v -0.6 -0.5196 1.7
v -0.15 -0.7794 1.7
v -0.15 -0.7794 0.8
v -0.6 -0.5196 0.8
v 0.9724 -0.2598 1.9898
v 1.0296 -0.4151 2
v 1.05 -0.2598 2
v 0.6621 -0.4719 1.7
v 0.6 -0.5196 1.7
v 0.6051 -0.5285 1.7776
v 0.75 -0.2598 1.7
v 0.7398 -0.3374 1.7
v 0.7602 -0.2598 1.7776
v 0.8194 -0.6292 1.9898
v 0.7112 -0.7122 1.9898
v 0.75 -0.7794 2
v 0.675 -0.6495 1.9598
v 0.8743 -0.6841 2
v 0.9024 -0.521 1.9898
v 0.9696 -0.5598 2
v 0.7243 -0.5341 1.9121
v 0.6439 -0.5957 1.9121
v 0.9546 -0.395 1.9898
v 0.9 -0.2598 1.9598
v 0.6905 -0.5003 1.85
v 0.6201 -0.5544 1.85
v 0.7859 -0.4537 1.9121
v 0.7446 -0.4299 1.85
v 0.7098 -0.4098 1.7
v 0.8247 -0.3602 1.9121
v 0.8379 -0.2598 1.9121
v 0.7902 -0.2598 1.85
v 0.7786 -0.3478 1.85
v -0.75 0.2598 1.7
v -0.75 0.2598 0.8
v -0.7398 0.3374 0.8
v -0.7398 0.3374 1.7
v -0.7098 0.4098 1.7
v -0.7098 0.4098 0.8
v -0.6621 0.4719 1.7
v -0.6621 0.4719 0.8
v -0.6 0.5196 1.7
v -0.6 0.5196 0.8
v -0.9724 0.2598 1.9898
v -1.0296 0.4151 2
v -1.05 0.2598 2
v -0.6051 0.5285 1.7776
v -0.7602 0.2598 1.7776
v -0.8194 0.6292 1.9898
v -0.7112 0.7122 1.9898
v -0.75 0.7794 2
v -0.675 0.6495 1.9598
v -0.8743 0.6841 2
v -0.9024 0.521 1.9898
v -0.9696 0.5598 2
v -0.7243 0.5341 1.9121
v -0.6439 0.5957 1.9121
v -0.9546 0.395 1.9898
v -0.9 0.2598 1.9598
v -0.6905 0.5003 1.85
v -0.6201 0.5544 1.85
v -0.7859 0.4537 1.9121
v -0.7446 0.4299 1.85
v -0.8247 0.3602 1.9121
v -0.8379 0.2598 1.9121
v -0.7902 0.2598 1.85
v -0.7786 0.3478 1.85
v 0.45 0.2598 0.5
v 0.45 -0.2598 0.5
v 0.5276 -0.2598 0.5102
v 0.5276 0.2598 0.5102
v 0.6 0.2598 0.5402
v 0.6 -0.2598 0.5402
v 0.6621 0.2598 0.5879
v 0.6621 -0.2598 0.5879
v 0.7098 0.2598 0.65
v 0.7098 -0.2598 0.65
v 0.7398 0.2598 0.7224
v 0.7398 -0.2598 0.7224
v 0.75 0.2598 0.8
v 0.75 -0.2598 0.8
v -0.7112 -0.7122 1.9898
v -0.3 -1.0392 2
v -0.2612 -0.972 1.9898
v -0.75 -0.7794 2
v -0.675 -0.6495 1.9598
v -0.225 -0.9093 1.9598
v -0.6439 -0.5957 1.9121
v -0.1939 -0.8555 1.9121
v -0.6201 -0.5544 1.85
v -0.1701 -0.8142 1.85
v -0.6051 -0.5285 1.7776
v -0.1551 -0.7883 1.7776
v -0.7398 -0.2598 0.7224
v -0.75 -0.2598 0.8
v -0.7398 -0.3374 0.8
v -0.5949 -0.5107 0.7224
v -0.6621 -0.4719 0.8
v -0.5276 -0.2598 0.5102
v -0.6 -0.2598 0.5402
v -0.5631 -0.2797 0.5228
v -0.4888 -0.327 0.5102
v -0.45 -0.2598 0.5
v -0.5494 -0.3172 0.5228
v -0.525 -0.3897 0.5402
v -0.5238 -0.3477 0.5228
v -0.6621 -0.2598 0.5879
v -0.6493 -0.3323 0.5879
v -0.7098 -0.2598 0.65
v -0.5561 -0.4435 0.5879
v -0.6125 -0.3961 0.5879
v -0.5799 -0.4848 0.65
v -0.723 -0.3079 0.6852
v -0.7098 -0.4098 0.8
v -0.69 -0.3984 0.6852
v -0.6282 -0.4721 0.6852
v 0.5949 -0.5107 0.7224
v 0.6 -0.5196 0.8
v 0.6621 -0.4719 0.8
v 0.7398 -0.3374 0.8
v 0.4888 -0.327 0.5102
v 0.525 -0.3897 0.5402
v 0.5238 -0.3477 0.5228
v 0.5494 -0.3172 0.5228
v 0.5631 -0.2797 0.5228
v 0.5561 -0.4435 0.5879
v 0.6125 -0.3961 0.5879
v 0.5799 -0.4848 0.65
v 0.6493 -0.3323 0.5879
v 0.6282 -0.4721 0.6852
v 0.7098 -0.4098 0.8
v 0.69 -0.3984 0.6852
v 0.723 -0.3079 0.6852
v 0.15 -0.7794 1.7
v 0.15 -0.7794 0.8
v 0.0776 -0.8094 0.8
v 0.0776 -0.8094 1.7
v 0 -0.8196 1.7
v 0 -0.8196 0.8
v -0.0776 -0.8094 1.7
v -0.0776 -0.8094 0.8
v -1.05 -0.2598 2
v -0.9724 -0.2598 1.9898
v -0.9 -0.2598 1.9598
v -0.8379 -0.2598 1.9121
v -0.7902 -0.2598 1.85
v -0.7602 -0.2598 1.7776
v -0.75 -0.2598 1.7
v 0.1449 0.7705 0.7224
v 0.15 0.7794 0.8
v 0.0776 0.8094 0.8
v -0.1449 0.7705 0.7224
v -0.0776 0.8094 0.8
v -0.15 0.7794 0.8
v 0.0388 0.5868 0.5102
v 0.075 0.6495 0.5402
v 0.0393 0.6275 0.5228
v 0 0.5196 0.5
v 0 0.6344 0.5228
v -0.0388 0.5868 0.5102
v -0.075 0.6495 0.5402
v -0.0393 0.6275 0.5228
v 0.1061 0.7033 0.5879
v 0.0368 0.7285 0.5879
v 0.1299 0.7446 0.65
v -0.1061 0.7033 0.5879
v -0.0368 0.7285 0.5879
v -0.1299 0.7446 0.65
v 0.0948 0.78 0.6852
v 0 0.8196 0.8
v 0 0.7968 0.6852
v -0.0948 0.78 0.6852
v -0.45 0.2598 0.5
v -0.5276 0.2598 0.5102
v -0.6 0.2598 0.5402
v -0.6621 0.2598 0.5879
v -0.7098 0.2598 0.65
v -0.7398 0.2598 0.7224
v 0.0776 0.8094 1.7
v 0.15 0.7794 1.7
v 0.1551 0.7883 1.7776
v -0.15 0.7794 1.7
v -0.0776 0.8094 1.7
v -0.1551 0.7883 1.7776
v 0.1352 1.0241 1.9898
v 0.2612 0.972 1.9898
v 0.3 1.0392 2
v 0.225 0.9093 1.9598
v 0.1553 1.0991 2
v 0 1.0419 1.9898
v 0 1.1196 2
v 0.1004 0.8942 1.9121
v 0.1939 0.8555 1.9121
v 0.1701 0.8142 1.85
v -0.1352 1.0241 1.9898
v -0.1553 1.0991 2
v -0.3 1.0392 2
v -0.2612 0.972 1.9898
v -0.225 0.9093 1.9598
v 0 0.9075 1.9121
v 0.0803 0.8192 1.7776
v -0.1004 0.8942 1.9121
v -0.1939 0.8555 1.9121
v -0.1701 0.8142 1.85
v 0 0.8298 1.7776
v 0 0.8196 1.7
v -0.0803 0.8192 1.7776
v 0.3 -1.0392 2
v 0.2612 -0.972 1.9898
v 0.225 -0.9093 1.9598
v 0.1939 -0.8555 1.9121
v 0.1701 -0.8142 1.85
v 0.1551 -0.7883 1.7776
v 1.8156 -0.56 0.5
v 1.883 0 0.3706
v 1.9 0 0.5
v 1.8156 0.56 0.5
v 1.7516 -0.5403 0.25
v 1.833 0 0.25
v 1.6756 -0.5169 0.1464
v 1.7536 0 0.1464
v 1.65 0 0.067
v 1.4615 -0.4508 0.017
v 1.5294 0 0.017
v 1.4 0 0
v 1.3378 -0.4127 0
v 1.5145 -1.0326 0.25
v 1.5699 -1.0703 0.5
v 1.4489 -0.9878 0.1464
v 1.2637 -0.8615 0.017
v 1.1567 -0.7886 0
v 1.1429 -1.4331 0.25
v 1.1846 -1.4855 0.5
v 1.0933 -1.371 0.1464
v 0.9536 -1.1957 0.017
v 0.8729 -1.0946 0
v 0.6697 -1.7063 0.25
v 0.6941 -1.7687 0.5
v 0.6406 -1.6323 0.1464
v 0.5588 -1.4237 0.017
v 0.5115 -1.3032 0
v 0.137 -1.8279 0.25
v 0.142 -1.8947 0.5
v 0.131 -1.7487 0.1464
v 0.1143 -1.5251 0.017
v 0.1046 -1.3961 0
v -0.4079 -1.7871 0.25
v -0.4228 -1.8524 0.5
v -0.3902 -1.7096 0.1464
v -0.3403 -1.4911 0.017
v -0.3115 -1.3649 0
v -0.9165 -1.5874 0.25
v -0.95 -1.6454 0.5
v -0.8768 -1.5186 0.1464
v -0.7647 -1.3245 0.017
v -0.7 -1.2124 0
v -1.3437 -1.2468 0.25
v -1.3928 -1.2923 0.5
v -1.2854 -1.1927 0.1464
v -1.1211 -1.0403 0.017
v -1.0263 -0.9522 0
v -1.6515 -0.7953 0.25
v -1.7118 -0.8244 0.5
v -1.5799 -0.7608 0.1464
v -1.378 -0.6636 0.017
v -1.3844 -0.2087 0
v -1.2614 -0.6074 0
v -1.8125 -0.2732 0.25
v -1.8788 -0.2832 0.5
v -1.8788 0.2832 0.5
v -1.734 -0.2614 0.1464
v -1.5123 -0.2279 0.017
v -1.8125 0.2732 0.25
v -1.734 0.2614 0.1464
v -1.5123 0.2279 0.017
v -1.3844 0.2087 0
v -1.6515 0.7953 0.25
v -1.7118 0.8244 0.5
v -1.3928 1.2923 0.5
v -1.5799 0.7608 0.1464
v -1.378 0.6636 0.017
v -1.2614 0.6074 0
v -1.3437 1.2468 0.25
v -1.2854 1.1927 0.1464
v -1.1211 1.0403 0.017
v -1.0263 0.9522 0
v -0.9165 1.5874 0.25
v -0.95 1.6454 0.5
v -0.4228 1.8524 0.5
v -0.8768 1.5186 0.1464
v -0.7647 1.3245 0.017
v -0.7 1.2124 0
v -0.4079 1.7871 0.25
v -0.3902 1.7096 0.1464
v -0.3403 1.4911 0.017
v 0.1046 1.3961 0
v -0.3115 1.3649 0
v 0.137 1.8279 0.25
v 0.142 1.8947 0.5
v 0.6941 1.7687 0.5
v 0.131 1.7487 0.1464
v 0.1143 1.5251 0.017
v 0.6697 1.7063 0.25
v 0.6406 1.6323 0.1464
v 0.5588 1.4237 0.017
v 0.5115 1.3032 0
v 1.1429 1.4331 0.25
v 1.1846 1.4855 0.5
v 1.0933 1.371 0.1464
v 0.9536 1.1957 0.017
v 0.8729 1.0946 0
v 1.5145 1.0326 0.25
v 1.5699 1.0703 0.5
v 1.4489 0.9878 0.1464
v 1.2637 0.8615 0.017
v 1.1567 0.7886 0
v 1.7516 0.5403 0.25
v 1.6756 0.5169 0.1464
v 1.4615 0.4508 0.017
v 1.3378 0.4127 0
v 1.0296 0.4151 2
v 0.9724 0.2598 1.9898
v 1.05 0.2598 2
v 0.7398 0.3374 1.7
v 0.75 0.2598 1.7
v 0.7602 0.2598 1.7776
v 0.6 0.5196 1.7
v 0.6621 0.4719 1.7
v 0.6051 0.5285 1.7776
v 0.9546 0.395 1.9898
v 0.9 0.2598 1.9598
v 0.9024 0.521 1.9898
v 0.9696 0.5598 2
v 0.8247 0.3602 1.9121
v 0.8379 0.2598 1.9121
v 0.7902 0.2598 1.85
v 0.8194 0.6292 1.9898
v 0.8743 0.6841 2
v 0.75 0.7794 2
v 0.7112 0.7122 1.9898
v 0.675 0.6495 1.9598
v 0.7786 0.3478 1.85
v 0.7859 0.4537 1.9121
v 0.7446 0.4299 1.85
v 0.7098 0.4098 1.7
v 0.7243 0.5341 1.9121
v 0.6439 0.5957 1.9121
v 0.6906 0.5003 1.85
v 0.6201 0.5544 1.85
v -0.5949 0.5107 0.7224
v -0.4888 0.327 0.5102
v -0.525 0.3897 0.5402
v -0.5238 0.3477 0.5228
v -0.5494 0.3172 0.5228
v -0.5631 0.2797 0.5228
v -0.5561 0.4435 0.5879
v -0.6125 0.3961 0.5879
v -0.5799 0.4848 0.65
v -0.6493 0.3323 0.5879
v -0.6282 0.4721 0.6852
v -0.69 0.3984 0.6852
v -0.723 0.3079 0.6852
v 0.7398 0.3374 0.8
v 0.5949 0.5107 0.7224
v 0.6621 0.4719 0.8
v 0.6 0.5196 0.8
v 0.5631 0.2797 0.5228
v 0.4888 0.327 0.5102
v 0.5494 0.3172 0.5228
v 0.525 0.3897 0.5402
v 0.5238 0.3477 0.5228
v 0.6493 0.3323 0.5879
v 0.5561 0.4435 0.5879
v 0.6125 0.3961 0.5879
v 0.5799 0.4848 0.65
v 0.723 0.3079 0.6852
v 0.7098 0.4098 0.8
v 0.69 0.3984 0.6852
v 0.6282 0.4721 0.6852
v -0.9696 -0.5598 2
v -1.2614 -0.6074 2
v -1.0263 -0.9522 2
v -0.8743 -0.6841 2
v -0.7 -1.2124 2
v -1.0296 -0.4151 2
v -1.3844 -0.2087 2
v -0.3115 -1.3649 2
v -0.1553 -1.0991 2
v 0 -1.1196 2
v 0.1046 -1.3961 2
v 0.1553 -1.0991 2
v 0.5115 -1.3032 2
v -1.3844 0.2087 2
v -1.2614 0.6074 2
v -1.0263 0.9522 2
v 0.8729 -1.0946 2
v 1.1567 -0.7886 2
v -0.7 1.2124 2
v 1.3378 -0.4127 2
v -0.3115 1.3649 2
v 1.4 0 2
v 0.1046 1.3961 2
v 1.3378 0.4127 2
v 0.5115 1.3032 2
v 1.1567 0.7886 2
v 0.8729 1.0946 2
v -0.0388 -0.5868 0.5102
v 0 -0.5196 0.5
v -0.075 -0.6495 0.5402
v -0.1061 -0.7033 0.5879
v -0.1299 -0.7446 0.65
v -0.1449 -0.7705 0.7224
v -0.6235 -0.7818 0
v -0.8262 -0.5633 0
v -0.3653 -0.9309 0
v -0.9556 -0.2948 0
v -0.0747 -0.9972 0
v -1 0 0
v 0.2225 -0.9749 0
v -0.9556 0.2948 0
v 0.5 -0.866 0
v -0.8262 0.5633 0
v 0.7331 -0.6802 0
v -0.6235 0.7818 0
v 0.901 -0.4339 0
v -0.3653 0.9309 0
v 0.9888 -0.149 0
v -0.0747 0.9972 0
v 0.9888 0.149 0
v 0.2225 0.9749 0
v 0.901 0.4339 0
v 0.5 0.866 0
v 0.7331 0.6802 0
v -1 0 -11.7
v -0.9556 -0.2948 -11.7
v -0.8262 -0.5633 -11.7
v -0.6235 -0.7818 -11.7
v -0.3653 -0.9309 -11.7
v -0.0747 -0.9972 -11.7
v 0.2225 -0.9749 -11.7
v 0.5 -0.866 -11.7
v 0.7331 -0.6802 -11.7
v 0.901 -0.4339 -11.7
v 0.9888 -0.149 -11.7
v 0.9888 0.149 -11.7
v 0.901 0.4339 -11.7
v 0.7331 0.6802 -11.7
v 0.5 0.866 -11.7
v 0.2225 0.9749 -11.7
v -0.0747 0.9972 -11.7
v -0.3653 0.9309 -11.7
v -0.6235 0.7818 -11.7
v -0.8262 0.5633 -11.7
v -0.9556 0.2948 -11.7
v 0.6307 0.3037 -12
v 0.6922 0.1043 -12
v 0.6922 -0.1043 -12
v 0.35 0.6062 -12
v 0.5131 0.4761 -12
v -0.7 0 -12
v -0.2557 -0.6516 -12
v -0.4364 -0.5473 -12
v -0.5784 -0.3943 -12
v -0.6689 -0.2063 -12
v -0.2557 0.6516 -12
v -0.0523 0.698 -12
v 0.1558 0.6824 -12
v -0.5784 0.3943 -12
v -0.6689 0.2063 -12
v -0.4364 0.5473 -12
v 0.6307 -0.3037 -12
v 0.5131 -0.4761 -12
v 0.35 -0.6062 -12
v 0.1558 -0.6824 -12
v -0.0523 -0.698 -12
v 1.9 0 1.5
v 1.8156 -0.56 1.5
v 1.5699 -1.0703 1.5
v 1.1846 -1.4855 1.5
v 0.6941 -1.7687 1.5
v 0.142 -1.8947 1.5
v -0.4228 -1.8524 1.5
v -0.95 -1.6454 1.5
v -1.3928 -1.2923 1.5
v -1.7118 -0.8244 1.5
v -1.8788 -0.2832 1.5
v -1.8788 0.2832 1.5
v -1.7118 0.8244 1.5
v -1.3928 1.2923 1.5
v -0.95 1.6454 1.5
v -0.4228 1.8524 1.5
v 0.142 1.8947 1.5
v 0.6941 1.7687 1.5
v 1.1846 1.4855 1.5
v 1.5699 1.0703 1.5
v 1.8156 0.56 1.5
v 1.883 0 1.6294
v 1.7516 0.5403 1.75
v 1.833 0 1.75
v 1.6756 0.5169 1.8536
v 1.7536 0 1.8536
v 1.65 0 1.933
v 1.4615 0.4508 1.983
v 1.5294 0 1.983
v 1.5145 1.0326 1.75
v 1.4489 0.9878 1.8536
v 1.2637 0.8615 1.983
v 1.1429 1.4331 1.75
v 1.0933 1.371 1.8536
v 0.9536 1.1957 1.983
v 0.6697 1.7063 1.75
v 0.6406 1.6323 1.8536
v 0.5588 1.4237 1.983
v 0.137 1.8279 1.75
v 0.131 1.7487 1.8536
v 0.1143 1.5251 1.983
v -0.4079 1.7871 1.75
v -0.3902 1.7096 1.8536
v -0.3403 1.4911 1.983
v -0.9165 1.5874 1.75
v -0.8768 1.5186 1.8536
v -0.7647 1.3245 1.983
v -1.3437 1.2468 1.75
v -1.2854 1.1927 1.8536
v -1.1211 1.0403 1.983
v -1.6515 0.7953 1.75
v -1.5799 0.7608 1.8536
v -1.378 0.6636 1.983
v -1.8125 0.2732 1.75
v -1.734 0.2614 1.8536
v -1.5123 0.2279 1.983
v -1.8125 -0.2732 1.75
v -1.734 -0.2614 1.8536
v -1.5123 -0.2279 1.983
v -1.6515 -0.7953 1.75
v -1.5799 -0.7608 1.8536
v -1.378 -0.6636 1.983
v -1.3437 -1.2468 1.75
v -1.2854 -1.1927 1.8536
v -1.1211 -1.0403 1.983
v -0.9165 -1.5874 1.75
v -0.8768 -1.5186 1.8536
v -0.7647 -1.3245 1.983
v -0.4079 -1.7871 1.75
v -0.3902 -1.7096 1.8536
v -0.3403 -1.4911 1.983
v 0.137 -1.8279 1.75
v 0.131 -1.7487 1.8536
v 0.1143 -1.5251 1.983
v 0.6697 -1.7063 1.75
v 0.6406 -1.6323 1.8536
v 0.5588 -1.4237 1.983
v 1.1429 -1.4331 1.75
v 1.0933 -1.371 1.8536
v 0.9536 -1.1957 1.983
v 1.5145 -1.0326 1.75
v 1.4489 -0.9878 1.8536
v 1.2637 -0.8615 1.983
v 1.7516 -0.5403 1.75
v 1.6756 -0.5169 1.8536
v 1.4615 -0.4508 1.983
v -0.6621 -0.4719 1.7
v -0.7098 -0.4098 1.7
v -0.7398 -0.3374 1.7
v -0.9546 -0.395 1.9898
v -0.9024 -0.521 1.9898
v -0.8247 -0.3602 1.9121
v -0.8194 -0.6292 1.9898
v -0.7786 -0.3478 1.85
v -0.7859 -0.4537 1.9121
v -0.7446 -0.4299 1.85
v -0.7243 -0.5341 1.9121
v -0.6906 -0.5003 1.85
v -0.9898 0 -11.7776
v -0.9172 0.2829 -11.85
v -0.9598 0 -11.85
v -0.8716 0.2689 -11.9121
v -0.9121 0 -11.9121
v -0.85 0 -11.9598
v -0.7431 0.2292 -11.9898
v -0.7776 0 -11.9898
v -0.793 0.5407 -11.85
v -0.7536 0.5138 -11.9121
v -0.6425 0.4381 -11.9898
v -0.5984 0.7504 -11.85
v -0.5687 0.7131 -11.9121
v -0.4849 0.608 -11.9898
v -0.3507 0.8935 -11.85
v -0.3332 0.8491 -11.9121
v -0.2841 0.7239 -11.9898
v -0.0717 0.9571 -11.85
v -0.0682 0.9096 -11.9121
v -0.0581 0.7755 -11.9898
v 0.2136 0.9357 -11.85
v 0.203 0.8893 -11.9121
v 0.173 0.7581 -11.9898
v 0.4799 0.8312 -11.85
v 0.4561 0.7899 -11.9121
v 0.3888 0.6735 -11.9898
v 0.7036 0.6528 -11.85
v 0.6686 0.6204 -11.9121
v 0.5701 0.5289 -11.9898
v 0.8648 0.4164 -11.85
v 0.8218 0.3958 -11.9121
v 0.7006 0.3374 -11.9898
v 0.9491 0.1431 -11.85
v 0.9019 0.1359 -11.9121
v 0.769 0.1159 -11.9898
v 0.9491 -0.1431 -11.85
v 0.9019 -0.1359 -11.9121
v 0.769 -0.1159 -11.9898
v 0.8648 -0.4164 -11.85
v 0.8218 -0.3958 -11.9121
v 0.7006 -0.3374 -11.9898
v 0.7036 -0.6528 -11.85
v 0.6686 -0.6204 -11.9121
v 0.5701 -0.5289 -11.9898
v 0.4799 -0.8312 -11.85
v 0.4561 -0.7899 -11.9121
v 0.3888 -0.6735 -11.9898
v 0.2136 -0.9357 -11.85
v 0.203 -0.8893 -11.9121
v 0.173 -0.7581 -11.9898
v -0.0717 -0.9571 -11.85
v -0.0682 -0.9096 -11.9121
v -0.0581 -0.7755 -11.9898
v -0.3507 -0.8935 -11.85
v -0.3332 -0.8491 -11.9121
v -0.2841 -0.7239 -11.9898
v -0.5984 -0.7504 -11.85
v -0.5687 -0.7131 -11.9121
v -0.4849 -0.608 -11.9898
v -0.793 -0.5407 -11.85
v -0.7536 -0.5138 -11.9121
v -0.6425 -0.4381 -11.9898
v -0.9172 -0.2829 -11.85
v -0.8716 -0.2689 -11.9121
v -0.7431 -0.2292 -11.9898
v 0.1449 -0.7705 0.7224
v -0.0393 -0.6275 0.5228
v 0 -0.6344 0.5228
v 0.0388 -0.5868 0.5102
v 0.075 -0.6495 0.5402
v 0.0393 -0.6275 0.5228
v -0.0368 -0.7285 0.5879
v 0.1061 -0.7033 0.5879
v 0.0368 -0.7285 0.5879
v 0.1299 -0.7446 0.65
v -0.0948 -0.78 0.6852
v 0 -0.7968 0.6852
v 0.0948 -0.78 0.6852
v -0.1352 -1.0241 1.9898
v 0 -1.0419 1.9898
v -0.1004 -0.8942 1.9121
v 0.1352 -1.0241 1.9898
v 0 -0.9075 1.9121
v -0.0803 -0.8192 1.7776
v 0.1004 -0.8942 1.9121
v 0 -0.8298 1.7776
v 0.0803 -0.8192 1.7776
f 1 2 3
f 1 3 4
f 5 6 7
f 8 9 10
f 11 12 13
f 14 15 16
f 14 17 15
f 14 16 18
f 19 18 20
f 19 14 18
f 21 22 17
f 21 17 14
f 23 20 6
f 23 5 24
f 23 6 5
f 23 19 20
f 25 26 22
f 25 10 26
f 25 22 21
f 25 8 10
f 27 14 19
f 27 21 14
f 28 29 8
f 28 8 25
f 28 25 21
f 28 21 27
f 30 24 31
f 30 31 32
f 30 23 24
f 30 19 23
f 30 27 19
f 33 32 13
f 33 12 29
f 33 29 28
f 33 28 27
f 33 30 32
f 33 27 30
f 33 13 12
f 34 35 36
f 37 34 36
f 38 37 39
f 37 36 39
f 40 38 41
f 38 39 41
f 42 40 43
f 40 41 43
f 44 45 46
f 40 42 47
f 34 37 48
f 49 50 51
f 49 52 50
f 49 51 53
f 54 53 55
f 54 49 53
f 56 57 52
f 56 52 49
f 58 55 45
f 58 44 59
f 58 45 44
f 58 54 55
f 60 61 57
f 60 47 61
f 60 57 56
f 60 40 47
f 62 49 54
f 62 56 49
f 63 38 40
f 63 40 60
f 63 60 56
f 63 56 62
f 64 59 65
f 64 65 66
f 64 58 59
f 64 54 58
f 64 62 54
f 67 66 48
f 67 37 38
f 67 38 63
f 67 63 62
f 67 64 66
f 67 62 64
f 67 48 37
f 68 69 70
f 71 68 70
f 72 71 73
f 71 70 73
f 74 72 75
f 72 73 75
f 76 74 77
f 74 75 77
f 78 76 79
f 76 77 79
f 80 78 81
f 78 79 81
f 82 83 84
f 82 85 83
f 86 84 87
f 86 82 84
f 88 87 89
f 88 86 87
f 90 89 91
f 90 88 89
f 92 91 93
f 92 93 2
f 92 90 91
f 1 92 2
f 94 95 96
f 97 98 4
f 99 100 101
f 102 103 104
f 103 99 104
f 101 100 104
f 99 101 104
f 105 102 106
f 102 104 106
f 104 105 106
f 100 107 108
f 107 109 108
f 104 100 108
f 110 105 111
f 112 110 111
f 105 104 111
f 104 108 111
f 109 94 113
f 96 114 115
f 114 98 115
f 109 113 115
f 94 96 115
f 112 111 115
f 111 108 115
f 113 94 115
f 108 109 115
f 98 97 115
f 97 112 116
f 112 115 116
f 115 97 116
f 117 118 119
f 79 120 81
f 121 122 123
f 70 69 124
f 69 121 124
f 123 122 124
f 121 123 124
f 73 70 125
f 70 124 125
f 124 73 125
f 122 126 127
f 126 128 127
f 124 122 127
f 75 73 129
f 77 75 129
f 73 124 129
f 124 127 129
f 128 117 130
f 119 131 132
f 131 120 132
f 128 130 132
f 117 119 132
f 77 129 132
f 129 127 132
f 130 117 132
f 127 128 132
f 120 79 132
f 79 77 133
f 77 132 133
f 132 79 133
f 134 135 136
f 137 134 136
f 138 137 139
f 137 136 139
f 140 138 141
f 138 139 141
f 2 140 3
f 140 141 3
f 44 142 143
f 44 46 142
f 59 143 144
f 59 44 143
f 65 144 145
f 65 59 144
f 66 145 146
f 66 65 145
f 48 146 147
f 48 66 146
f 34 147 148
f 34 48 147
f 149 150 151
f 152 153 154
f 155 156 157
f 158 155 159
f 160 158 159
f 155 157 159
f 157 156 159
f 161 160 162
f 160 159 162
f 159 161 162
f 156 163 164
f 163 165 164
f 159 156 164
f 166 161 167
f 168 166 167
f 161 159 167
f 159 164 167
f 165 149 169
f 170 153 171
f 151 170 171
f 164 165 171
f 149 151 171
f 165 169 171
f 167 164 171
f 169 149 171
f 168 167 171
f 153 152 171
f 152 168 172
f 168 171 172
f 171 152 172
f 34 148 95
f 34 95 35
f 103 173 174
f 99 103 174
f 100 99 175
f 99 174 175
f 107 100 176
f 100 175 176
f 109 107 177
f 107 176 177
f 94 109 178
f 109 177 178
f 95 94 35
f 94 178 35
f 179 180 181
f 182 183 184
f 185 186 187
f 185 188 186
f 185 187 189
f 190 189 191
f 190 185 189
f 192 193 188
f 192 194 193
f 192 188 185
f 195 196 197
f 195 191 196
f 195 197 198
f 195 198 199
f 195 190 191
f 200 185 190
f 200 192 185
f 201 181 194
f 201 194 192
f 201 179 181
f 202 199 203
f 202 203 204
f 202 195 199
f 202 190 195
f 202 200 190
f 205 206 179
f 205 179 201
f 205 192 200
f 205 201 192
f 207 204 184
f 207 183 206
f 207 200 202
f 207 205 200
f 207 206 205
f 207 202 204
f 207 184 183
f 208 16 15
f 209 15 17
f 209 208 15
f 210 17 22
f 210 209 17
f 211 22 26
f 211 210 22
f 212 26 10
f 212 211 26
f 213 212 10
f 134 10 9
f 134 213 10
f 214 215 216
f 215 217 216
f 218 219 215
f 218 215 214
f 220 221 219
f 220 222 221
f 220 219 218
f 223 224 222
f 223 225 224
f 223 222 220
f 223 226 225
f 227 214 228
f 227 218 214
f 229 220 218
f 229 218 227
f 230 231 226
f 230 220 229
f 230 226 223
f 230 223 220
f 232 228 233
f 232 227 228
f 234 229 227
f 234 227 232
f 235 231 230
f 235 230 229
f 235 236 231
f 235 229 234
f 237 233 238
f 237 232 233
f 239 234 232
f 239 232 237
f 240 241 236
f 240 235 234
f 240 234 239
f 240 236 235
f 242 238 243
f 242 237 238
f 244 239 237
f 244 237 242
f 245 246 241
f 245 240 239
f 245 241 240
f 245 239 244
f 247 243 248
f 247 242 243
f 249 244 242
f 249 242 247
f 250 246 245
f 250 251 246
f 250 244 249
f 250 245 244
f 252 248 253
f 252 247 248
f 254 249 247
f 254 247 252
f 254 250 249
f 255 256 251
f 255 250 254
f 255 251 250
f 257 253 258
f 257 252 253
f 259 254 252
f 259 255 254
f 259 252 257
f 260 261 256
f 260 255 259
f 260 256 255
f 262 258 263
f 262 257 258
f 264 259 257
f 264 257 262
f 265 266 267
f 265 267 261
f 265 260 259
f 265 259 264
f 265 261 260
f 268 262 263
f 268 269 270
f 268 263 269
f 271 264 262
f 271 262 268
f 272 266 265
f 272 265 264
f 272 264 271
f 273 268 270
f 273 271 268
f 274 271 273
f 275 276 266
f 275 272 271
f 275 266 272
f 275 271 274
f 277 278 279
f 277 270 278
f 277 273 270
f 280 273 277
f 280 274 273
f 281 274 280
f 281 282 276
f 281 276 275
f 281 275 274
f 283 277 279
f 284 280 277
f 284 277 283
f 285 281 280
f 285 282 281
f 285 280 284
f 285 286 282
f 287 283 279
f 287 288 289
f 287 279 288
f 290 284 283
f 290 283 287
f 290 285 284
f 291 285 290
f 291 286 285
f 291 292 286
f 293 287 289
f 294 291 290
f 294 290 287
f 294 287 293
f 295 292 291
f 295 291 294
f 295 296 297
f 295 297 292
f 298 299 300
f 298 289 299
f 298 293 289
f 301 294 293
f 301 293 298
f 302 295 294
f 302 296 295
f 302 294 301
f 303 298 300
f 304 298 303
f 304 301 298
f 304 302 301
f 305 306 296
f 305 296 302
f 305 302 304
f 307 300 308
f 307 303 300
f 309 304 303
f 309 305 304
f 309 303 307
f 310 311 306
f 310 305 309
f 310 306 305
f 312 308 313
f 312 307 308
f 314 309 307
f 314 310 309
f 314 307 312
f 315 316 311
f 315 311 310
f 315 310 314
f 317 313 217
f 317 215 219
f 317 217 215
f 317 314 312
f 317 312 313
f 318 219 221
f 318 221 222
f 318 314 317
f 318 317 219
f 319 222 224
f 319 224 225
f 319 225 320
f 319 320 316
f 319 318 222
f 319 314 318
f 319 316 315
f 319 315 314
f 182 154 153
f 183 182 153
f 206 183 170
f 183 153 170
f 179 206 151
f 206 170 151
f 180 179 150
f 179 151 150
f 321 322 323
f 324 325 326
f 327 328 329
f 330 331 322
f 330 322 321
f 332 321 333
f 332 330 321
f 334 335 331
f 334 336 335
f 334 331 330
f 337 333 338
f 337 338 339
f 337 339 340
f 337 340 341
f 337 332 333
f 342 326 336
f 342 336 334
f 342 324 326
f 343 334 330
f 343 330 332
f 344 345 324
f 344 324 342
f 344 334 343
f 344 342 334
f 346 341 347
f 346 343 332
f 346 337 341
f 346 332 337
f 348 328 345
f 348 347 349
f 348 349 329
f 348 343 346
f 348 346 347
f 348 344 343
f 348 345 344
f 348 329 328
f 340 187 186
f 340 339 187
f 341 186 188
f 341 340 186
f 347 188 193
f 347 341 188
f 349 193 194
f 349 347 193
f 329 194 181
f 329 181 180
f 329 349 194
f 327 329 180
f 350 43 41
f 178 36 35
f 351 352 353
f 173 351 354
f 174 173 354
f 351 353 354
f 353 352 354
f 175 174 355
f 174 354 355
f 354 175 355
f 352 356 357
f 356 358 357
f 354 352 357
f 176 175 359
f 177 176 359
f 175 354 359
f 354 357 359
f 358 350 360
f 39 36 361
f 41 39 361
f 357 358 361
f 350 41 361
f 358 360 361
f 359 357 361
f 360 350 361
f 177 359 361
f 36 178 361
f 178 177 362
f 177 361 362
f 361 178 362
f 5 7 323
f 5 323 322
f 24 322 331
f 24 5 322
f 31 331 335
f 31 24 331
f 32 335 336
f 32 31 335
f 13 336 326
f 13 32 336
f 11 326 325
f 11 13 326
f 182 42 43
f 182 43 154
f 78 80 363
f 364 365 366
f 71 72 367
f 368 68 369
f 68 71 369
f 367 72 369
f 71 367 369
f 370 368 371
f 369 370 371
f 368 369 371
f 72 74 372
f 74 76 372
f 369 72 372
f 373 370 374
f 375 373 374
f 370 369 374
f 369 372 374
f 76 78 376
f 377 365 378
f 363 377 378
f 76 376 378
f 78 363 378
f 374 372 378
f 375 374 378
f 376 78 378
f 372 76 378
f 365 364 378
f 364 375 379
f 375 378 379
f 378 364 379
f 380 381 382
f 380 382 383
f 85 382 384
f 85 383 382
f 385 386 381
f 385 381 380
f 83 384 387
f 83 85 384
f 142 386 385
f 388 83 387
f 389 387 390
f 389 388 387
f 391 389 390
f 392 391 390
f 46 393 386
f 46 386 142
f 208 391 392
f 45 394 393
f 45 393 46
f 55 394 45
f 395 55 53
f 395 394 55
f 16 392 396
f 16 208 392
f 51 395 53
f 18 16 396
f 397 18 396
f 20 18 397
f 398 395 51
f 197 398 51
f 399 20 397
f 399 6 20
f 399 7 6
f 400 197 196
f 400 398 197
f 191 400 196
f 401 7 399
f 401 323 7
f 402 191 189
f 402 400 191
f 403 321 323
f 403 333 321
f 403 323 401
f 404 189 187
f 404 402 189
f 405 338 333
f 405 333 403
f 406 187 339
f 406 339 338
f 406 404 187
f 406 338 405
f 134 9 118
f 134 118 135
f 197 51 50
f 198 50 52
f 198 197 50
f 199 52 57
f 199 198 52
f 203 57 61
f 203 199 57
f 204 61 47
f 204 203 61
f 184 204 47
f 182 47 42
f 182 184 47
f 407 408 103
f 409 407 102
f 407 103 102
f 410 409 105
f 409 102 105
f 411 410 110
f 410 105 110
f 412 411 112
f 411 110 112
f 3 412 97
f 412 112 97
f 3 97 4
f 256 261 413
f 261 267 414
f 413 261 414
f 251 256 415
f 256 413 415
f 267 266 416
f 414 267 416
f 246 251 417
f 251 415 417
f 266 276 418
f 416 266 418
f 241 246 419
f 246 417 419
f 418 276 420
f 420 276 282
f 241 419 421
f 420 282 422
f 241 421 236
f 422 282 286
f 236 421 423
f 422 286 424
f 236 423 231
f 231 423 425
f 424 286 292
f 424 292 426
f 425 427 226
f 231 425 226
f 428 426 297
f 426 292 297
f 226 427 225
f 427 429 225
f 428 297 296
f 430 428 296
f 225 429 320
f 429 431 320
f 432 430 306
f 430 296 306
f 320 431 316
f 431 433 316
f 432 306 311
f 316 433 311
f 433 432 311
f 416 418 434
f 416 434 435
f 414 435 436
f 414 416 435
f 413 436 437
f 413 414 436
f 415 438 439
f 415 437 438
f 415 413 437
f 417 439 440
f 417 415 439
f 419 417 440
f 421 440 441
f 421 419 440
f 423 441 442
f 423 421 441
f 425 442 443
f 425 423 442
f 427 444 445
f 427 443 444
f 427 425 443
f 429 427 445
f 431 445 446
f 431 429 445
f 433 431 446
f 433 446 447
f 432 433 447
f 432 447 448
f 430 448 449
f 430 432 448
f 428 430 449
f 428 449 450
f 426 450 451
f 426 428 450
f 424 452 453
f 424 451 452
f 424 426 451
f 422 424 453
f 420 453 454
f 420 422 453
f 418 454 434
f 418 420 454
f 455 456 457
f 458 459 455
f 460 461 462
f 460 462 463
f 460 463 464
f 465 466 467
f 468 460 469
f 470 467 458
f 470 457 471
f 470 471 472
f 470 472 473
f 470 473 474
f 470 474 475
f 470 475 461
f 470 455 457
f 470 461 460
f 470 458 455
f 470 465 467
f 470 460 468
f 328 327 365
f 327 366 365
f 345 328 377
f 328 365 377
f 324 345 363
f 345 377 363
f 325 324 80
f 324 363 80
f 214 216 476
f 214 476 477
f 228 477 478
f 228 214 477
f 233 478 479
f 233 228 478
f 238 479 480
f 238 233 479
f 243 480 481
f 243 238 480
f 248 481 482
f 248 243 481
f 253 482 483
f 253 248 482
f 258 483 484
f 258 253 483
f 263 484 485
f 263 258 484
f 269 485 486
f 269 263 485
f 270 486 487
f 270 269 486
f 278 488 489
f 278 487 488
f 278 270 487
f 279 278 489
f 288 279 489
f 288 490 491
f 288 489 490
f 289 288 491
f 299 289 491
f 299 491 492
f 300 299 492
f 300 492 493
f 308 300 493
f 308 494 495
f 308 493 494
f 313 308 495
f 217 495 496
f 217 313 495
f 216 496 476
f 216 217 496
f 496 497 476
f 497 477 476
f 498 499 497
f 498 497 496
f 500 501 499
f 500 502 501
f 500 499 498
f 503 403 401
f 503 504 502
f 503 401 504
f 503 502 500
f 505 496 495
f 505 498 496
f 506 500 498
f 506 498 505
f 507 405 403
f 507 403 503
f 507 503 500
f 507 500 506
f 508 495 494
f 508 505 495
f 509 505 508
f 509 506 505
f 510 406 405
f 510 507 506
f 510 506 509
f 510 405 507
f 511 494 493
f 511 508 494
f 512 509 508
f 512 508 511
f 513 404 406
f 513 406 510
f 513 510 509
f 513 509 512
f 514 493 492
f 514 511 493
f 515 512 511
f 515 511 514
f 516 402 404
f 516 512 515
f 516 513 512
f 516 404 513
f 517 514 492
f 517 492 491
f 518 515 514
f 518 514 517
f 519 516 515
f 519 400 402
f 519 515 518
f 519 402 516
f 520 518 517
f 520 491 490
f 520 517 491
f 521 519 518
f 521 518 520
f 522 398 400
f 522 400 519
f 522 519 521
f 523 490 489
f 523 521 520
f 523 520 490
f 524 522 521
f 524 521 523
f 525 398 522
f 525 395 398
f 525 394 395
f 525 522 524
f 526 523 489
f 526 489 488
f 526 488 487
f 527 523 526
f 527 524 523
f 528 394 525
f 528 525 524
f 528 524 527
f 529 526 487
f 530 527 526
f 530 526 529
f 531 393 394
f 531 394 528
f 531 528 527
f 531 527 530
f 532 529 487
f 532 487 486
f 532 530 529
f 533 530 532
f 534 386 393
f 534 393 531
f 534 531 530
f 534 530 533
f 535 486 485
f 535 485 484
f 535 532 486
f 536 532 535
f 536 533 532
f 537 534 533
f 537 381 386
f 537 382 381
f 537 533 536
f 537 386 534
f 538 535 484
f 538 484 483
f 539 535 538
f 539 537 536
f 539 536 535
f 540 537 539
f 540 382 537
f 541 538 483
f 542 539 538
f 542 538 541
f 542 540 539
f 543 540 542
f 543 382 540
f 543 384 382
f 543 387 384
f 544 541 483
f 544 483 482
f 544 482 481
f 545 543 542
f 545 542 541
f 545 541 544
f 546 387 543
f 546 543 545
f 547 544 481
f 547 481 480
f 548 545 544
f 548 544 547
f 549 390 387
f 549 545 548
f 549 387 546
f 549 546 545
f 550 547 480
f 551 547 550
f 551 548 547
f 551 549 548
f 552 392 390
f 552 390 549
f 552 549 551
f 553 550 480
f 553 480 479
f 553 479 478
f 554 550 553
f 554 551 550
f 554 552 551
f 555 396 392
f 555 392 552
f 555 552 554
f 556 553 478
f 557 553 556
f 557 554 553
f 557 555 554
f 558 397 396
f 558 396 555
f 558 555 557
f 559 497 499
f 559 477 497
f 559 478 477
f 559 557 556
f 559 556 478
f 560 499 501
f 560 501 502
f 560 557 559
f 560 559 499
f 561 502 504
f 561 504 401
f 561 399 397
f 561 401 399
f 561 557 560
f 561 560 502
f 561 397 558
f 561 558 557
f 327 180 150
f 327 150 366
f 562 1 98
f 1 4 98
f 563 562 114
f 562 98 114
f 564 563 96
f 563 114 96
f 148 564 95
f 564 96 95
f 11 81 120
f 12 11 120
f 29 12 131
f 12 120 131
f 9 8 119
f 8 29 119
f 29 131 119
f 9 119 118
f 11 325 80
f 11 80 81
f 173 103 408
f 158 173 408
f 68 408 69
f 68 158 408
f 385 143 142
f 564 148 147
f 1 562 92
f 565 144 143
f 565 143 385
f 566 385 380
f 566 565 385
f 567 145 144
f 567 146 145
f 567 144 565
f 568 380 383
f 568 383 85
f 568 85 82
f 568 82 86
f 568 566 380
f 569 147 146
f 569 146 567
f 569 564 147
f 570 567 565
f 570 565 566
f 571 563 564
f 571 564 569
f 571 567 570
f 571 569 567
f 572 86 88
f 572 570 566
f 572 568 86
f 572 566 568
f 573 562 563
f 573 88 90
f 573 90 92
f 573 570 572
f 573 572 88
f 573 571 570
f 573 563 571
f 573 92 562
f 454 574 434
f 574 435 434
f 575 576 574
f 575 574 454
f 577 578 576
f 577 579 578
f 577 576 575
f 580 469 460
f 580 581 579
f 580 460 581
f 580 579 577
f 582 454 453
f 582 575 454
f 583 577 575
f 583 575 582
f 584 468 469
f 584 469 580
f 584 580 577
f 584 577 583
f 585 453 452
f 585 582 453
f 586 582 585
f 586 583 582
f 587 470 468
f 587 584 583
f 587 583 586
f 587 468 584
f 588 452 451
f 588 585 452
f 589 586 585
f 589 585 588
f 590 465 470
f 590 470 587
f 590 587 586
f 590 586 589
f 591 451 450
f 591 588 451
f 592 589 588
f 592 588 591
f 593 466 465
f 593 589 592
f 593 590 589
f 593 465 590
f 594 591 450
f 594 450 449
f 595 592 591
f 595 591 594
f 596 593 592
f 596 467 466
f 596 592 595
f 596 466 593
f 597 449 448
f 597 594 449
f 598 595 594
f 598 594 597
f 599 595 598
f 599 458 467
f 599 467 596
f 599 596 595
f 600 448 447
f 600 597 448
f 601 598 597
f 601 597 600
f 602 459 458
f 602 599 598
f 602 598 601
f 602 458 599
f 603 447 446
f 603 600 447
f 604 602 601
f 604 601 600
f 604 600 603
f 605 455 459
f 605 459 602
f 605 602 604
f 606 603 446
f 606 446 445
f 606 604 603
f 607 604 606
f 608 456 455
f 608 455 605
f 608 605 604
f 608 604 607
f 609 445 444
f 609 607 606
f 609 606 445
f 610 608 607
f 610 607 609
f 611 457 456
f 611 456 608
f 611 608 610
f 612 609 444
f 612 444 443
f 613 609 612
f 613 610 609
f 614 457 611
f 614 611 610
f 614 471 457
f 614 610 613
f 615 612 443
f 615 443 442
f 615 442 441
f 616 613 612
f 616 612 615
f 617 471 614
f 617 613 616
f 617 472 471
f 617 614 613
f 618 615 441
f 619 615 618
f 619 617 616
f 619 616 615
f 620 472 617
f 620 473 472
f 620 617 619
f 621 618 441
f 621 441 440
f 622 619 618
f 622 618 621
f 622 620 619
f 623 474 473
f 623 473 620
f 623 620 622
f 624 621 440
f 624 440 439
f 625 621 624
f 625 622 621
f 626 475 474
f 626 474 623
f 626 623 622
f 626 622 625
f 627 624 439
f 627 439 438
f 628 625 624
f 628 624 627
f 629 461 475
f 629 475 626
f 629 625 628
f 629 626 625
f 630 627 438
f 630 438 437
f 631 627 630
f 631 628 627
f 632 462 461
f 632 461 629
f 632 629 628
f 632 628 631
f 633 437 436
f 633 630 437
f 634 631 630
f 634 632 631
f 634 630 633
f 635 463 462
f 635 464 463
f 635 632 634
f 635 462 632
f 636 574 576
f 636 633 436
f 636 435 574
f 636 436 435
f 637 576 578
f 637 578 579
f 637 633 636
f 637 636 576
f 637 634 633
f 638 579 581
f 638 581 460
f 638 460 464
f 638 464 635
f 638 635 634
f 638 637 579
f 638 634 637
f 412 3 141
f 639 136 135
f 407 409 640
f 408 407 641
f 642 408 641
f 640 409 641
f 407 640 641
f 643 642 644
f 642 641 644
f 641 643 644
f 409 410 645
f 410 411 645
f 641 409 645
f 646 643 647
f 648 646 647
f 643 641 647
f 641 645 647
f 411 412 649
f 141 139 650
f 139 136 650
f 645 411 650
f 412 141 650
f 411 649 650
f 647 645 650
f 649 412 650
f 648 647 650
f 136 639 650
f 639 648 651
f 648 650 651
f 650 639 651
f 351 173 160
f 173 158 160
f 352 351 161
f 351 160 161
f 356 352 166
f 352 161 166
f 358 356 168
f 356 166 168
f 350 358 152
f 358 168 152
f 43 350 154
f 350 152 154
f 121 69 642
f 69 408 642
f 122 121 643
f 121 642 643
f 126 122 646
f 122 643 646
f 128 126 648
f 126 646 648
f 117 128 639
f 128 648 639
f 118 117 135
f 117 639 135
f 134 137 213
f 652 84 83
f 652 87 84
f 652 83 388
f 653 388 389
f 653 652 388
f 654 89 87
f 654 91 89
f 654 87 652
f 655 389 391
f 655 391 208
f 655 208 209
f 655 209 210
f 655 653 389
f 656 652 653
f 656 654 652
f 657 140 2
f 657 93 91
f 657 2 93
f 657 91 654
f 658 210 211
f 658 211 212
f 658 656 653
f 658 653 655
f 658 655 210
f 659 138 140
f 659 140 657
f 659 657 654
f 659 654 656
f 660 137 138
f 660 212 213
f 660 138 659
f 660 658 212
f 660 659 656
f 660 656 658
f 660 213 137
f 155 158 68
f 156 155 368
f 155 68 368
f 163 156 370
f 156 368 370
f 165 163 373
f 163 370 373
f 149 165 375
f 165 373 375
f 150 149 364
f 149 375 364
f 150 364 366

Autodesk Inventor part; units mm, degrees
ref_plane "YZ Plane" through (0, 0, 0) normal (1, 0, 0) x (0, 1, 0)
ref_plane "XZ Plane" through (0, 0, 0) normal (0, 1, 0) x (-1, 0, 0)
ref_plane "XY Plane" through (0, 0, 0) normal (0, 0, 1) x (1, 0, 0)
sketch "スケッチ1" plane through (0, 0, 0) normal (0, 0, 1) x (1, 0, 0)
  circle A0 centre (0, 0) radius 1.9
  dimension "d0" = 3.8
extrude "押し出し1" add sketch "スケッチ1" along normal blind 2
sketch "スケッチ2" plane through (0, 0, 0) normal (0, 0, -1) x (-1, 0, 0)
  circle A0 centre (0, 0) radius 1.9 projected
  circle A1 centre (0, 0) radius 1
  dimension "d3" = 2
extrude "押し出し2" add sketch "スケッチ2" along normal blind 12 contours A1
sketch "スケッチ3" plane through (0, 0, 2) normal (0, 0, 1) x (1, 0, 0)
  circle A0 centre (0, 0) radius 1.9 projected
  line L0 (0, 0.866) -> (0.75, 0.433)
  line L1 (0.75, 0.433) -> (0.75, -0.433)
  line L2 (0.75, -0.433) -> (0, -0.866)
  line L3 (0, -0.866) -> (-0.75, -0.433)
  line L4 (-0.75, -0.433) -> (-0.75, 0.433)
  line L5 (-0.75, 0.433) -> (0, 0.866)
  dimension "d6" = 0.75
extrude "押し出し3" cut sketch "スケッチ3" against normal blind 1.5 contours L0 L1 L2 L3 L4 L5
fillet "フィレット1" radius 0.5 2 edges at (-1.9, 0, 2) (-1.9, 0, 0)
fillet "フィレット2" radius 0.3 19 edges at (-0.375, 0.6495, 2) (-0.75, 0, 2) (-0.375, -0.6495, 2) (0.375, -0.6495, 2) (0.75, 0, 2) (0.375, 0.6495, 2) (-0.375, 0.6495, 0.5) (0.375, 0.6495, 0.5) (0, 0.866, 1.25) (-0.75, 0.433, 1.25) (-0.375, -0.6495, 0.5) (-0.75, -0.433, 1.25) (-0.75, 0, 0.5) (0.75, 0, 0.5) (0.75, 0.433, 1.25) (0.75, -0.433, 1.25) (0.375, -0.6495, 0.5) (0, -0.866, 1.25) (1, 0, -12)
thread "ねじ3" size "M2x0.4" class "6g" standard "ANSI Metric M Profile" full length
